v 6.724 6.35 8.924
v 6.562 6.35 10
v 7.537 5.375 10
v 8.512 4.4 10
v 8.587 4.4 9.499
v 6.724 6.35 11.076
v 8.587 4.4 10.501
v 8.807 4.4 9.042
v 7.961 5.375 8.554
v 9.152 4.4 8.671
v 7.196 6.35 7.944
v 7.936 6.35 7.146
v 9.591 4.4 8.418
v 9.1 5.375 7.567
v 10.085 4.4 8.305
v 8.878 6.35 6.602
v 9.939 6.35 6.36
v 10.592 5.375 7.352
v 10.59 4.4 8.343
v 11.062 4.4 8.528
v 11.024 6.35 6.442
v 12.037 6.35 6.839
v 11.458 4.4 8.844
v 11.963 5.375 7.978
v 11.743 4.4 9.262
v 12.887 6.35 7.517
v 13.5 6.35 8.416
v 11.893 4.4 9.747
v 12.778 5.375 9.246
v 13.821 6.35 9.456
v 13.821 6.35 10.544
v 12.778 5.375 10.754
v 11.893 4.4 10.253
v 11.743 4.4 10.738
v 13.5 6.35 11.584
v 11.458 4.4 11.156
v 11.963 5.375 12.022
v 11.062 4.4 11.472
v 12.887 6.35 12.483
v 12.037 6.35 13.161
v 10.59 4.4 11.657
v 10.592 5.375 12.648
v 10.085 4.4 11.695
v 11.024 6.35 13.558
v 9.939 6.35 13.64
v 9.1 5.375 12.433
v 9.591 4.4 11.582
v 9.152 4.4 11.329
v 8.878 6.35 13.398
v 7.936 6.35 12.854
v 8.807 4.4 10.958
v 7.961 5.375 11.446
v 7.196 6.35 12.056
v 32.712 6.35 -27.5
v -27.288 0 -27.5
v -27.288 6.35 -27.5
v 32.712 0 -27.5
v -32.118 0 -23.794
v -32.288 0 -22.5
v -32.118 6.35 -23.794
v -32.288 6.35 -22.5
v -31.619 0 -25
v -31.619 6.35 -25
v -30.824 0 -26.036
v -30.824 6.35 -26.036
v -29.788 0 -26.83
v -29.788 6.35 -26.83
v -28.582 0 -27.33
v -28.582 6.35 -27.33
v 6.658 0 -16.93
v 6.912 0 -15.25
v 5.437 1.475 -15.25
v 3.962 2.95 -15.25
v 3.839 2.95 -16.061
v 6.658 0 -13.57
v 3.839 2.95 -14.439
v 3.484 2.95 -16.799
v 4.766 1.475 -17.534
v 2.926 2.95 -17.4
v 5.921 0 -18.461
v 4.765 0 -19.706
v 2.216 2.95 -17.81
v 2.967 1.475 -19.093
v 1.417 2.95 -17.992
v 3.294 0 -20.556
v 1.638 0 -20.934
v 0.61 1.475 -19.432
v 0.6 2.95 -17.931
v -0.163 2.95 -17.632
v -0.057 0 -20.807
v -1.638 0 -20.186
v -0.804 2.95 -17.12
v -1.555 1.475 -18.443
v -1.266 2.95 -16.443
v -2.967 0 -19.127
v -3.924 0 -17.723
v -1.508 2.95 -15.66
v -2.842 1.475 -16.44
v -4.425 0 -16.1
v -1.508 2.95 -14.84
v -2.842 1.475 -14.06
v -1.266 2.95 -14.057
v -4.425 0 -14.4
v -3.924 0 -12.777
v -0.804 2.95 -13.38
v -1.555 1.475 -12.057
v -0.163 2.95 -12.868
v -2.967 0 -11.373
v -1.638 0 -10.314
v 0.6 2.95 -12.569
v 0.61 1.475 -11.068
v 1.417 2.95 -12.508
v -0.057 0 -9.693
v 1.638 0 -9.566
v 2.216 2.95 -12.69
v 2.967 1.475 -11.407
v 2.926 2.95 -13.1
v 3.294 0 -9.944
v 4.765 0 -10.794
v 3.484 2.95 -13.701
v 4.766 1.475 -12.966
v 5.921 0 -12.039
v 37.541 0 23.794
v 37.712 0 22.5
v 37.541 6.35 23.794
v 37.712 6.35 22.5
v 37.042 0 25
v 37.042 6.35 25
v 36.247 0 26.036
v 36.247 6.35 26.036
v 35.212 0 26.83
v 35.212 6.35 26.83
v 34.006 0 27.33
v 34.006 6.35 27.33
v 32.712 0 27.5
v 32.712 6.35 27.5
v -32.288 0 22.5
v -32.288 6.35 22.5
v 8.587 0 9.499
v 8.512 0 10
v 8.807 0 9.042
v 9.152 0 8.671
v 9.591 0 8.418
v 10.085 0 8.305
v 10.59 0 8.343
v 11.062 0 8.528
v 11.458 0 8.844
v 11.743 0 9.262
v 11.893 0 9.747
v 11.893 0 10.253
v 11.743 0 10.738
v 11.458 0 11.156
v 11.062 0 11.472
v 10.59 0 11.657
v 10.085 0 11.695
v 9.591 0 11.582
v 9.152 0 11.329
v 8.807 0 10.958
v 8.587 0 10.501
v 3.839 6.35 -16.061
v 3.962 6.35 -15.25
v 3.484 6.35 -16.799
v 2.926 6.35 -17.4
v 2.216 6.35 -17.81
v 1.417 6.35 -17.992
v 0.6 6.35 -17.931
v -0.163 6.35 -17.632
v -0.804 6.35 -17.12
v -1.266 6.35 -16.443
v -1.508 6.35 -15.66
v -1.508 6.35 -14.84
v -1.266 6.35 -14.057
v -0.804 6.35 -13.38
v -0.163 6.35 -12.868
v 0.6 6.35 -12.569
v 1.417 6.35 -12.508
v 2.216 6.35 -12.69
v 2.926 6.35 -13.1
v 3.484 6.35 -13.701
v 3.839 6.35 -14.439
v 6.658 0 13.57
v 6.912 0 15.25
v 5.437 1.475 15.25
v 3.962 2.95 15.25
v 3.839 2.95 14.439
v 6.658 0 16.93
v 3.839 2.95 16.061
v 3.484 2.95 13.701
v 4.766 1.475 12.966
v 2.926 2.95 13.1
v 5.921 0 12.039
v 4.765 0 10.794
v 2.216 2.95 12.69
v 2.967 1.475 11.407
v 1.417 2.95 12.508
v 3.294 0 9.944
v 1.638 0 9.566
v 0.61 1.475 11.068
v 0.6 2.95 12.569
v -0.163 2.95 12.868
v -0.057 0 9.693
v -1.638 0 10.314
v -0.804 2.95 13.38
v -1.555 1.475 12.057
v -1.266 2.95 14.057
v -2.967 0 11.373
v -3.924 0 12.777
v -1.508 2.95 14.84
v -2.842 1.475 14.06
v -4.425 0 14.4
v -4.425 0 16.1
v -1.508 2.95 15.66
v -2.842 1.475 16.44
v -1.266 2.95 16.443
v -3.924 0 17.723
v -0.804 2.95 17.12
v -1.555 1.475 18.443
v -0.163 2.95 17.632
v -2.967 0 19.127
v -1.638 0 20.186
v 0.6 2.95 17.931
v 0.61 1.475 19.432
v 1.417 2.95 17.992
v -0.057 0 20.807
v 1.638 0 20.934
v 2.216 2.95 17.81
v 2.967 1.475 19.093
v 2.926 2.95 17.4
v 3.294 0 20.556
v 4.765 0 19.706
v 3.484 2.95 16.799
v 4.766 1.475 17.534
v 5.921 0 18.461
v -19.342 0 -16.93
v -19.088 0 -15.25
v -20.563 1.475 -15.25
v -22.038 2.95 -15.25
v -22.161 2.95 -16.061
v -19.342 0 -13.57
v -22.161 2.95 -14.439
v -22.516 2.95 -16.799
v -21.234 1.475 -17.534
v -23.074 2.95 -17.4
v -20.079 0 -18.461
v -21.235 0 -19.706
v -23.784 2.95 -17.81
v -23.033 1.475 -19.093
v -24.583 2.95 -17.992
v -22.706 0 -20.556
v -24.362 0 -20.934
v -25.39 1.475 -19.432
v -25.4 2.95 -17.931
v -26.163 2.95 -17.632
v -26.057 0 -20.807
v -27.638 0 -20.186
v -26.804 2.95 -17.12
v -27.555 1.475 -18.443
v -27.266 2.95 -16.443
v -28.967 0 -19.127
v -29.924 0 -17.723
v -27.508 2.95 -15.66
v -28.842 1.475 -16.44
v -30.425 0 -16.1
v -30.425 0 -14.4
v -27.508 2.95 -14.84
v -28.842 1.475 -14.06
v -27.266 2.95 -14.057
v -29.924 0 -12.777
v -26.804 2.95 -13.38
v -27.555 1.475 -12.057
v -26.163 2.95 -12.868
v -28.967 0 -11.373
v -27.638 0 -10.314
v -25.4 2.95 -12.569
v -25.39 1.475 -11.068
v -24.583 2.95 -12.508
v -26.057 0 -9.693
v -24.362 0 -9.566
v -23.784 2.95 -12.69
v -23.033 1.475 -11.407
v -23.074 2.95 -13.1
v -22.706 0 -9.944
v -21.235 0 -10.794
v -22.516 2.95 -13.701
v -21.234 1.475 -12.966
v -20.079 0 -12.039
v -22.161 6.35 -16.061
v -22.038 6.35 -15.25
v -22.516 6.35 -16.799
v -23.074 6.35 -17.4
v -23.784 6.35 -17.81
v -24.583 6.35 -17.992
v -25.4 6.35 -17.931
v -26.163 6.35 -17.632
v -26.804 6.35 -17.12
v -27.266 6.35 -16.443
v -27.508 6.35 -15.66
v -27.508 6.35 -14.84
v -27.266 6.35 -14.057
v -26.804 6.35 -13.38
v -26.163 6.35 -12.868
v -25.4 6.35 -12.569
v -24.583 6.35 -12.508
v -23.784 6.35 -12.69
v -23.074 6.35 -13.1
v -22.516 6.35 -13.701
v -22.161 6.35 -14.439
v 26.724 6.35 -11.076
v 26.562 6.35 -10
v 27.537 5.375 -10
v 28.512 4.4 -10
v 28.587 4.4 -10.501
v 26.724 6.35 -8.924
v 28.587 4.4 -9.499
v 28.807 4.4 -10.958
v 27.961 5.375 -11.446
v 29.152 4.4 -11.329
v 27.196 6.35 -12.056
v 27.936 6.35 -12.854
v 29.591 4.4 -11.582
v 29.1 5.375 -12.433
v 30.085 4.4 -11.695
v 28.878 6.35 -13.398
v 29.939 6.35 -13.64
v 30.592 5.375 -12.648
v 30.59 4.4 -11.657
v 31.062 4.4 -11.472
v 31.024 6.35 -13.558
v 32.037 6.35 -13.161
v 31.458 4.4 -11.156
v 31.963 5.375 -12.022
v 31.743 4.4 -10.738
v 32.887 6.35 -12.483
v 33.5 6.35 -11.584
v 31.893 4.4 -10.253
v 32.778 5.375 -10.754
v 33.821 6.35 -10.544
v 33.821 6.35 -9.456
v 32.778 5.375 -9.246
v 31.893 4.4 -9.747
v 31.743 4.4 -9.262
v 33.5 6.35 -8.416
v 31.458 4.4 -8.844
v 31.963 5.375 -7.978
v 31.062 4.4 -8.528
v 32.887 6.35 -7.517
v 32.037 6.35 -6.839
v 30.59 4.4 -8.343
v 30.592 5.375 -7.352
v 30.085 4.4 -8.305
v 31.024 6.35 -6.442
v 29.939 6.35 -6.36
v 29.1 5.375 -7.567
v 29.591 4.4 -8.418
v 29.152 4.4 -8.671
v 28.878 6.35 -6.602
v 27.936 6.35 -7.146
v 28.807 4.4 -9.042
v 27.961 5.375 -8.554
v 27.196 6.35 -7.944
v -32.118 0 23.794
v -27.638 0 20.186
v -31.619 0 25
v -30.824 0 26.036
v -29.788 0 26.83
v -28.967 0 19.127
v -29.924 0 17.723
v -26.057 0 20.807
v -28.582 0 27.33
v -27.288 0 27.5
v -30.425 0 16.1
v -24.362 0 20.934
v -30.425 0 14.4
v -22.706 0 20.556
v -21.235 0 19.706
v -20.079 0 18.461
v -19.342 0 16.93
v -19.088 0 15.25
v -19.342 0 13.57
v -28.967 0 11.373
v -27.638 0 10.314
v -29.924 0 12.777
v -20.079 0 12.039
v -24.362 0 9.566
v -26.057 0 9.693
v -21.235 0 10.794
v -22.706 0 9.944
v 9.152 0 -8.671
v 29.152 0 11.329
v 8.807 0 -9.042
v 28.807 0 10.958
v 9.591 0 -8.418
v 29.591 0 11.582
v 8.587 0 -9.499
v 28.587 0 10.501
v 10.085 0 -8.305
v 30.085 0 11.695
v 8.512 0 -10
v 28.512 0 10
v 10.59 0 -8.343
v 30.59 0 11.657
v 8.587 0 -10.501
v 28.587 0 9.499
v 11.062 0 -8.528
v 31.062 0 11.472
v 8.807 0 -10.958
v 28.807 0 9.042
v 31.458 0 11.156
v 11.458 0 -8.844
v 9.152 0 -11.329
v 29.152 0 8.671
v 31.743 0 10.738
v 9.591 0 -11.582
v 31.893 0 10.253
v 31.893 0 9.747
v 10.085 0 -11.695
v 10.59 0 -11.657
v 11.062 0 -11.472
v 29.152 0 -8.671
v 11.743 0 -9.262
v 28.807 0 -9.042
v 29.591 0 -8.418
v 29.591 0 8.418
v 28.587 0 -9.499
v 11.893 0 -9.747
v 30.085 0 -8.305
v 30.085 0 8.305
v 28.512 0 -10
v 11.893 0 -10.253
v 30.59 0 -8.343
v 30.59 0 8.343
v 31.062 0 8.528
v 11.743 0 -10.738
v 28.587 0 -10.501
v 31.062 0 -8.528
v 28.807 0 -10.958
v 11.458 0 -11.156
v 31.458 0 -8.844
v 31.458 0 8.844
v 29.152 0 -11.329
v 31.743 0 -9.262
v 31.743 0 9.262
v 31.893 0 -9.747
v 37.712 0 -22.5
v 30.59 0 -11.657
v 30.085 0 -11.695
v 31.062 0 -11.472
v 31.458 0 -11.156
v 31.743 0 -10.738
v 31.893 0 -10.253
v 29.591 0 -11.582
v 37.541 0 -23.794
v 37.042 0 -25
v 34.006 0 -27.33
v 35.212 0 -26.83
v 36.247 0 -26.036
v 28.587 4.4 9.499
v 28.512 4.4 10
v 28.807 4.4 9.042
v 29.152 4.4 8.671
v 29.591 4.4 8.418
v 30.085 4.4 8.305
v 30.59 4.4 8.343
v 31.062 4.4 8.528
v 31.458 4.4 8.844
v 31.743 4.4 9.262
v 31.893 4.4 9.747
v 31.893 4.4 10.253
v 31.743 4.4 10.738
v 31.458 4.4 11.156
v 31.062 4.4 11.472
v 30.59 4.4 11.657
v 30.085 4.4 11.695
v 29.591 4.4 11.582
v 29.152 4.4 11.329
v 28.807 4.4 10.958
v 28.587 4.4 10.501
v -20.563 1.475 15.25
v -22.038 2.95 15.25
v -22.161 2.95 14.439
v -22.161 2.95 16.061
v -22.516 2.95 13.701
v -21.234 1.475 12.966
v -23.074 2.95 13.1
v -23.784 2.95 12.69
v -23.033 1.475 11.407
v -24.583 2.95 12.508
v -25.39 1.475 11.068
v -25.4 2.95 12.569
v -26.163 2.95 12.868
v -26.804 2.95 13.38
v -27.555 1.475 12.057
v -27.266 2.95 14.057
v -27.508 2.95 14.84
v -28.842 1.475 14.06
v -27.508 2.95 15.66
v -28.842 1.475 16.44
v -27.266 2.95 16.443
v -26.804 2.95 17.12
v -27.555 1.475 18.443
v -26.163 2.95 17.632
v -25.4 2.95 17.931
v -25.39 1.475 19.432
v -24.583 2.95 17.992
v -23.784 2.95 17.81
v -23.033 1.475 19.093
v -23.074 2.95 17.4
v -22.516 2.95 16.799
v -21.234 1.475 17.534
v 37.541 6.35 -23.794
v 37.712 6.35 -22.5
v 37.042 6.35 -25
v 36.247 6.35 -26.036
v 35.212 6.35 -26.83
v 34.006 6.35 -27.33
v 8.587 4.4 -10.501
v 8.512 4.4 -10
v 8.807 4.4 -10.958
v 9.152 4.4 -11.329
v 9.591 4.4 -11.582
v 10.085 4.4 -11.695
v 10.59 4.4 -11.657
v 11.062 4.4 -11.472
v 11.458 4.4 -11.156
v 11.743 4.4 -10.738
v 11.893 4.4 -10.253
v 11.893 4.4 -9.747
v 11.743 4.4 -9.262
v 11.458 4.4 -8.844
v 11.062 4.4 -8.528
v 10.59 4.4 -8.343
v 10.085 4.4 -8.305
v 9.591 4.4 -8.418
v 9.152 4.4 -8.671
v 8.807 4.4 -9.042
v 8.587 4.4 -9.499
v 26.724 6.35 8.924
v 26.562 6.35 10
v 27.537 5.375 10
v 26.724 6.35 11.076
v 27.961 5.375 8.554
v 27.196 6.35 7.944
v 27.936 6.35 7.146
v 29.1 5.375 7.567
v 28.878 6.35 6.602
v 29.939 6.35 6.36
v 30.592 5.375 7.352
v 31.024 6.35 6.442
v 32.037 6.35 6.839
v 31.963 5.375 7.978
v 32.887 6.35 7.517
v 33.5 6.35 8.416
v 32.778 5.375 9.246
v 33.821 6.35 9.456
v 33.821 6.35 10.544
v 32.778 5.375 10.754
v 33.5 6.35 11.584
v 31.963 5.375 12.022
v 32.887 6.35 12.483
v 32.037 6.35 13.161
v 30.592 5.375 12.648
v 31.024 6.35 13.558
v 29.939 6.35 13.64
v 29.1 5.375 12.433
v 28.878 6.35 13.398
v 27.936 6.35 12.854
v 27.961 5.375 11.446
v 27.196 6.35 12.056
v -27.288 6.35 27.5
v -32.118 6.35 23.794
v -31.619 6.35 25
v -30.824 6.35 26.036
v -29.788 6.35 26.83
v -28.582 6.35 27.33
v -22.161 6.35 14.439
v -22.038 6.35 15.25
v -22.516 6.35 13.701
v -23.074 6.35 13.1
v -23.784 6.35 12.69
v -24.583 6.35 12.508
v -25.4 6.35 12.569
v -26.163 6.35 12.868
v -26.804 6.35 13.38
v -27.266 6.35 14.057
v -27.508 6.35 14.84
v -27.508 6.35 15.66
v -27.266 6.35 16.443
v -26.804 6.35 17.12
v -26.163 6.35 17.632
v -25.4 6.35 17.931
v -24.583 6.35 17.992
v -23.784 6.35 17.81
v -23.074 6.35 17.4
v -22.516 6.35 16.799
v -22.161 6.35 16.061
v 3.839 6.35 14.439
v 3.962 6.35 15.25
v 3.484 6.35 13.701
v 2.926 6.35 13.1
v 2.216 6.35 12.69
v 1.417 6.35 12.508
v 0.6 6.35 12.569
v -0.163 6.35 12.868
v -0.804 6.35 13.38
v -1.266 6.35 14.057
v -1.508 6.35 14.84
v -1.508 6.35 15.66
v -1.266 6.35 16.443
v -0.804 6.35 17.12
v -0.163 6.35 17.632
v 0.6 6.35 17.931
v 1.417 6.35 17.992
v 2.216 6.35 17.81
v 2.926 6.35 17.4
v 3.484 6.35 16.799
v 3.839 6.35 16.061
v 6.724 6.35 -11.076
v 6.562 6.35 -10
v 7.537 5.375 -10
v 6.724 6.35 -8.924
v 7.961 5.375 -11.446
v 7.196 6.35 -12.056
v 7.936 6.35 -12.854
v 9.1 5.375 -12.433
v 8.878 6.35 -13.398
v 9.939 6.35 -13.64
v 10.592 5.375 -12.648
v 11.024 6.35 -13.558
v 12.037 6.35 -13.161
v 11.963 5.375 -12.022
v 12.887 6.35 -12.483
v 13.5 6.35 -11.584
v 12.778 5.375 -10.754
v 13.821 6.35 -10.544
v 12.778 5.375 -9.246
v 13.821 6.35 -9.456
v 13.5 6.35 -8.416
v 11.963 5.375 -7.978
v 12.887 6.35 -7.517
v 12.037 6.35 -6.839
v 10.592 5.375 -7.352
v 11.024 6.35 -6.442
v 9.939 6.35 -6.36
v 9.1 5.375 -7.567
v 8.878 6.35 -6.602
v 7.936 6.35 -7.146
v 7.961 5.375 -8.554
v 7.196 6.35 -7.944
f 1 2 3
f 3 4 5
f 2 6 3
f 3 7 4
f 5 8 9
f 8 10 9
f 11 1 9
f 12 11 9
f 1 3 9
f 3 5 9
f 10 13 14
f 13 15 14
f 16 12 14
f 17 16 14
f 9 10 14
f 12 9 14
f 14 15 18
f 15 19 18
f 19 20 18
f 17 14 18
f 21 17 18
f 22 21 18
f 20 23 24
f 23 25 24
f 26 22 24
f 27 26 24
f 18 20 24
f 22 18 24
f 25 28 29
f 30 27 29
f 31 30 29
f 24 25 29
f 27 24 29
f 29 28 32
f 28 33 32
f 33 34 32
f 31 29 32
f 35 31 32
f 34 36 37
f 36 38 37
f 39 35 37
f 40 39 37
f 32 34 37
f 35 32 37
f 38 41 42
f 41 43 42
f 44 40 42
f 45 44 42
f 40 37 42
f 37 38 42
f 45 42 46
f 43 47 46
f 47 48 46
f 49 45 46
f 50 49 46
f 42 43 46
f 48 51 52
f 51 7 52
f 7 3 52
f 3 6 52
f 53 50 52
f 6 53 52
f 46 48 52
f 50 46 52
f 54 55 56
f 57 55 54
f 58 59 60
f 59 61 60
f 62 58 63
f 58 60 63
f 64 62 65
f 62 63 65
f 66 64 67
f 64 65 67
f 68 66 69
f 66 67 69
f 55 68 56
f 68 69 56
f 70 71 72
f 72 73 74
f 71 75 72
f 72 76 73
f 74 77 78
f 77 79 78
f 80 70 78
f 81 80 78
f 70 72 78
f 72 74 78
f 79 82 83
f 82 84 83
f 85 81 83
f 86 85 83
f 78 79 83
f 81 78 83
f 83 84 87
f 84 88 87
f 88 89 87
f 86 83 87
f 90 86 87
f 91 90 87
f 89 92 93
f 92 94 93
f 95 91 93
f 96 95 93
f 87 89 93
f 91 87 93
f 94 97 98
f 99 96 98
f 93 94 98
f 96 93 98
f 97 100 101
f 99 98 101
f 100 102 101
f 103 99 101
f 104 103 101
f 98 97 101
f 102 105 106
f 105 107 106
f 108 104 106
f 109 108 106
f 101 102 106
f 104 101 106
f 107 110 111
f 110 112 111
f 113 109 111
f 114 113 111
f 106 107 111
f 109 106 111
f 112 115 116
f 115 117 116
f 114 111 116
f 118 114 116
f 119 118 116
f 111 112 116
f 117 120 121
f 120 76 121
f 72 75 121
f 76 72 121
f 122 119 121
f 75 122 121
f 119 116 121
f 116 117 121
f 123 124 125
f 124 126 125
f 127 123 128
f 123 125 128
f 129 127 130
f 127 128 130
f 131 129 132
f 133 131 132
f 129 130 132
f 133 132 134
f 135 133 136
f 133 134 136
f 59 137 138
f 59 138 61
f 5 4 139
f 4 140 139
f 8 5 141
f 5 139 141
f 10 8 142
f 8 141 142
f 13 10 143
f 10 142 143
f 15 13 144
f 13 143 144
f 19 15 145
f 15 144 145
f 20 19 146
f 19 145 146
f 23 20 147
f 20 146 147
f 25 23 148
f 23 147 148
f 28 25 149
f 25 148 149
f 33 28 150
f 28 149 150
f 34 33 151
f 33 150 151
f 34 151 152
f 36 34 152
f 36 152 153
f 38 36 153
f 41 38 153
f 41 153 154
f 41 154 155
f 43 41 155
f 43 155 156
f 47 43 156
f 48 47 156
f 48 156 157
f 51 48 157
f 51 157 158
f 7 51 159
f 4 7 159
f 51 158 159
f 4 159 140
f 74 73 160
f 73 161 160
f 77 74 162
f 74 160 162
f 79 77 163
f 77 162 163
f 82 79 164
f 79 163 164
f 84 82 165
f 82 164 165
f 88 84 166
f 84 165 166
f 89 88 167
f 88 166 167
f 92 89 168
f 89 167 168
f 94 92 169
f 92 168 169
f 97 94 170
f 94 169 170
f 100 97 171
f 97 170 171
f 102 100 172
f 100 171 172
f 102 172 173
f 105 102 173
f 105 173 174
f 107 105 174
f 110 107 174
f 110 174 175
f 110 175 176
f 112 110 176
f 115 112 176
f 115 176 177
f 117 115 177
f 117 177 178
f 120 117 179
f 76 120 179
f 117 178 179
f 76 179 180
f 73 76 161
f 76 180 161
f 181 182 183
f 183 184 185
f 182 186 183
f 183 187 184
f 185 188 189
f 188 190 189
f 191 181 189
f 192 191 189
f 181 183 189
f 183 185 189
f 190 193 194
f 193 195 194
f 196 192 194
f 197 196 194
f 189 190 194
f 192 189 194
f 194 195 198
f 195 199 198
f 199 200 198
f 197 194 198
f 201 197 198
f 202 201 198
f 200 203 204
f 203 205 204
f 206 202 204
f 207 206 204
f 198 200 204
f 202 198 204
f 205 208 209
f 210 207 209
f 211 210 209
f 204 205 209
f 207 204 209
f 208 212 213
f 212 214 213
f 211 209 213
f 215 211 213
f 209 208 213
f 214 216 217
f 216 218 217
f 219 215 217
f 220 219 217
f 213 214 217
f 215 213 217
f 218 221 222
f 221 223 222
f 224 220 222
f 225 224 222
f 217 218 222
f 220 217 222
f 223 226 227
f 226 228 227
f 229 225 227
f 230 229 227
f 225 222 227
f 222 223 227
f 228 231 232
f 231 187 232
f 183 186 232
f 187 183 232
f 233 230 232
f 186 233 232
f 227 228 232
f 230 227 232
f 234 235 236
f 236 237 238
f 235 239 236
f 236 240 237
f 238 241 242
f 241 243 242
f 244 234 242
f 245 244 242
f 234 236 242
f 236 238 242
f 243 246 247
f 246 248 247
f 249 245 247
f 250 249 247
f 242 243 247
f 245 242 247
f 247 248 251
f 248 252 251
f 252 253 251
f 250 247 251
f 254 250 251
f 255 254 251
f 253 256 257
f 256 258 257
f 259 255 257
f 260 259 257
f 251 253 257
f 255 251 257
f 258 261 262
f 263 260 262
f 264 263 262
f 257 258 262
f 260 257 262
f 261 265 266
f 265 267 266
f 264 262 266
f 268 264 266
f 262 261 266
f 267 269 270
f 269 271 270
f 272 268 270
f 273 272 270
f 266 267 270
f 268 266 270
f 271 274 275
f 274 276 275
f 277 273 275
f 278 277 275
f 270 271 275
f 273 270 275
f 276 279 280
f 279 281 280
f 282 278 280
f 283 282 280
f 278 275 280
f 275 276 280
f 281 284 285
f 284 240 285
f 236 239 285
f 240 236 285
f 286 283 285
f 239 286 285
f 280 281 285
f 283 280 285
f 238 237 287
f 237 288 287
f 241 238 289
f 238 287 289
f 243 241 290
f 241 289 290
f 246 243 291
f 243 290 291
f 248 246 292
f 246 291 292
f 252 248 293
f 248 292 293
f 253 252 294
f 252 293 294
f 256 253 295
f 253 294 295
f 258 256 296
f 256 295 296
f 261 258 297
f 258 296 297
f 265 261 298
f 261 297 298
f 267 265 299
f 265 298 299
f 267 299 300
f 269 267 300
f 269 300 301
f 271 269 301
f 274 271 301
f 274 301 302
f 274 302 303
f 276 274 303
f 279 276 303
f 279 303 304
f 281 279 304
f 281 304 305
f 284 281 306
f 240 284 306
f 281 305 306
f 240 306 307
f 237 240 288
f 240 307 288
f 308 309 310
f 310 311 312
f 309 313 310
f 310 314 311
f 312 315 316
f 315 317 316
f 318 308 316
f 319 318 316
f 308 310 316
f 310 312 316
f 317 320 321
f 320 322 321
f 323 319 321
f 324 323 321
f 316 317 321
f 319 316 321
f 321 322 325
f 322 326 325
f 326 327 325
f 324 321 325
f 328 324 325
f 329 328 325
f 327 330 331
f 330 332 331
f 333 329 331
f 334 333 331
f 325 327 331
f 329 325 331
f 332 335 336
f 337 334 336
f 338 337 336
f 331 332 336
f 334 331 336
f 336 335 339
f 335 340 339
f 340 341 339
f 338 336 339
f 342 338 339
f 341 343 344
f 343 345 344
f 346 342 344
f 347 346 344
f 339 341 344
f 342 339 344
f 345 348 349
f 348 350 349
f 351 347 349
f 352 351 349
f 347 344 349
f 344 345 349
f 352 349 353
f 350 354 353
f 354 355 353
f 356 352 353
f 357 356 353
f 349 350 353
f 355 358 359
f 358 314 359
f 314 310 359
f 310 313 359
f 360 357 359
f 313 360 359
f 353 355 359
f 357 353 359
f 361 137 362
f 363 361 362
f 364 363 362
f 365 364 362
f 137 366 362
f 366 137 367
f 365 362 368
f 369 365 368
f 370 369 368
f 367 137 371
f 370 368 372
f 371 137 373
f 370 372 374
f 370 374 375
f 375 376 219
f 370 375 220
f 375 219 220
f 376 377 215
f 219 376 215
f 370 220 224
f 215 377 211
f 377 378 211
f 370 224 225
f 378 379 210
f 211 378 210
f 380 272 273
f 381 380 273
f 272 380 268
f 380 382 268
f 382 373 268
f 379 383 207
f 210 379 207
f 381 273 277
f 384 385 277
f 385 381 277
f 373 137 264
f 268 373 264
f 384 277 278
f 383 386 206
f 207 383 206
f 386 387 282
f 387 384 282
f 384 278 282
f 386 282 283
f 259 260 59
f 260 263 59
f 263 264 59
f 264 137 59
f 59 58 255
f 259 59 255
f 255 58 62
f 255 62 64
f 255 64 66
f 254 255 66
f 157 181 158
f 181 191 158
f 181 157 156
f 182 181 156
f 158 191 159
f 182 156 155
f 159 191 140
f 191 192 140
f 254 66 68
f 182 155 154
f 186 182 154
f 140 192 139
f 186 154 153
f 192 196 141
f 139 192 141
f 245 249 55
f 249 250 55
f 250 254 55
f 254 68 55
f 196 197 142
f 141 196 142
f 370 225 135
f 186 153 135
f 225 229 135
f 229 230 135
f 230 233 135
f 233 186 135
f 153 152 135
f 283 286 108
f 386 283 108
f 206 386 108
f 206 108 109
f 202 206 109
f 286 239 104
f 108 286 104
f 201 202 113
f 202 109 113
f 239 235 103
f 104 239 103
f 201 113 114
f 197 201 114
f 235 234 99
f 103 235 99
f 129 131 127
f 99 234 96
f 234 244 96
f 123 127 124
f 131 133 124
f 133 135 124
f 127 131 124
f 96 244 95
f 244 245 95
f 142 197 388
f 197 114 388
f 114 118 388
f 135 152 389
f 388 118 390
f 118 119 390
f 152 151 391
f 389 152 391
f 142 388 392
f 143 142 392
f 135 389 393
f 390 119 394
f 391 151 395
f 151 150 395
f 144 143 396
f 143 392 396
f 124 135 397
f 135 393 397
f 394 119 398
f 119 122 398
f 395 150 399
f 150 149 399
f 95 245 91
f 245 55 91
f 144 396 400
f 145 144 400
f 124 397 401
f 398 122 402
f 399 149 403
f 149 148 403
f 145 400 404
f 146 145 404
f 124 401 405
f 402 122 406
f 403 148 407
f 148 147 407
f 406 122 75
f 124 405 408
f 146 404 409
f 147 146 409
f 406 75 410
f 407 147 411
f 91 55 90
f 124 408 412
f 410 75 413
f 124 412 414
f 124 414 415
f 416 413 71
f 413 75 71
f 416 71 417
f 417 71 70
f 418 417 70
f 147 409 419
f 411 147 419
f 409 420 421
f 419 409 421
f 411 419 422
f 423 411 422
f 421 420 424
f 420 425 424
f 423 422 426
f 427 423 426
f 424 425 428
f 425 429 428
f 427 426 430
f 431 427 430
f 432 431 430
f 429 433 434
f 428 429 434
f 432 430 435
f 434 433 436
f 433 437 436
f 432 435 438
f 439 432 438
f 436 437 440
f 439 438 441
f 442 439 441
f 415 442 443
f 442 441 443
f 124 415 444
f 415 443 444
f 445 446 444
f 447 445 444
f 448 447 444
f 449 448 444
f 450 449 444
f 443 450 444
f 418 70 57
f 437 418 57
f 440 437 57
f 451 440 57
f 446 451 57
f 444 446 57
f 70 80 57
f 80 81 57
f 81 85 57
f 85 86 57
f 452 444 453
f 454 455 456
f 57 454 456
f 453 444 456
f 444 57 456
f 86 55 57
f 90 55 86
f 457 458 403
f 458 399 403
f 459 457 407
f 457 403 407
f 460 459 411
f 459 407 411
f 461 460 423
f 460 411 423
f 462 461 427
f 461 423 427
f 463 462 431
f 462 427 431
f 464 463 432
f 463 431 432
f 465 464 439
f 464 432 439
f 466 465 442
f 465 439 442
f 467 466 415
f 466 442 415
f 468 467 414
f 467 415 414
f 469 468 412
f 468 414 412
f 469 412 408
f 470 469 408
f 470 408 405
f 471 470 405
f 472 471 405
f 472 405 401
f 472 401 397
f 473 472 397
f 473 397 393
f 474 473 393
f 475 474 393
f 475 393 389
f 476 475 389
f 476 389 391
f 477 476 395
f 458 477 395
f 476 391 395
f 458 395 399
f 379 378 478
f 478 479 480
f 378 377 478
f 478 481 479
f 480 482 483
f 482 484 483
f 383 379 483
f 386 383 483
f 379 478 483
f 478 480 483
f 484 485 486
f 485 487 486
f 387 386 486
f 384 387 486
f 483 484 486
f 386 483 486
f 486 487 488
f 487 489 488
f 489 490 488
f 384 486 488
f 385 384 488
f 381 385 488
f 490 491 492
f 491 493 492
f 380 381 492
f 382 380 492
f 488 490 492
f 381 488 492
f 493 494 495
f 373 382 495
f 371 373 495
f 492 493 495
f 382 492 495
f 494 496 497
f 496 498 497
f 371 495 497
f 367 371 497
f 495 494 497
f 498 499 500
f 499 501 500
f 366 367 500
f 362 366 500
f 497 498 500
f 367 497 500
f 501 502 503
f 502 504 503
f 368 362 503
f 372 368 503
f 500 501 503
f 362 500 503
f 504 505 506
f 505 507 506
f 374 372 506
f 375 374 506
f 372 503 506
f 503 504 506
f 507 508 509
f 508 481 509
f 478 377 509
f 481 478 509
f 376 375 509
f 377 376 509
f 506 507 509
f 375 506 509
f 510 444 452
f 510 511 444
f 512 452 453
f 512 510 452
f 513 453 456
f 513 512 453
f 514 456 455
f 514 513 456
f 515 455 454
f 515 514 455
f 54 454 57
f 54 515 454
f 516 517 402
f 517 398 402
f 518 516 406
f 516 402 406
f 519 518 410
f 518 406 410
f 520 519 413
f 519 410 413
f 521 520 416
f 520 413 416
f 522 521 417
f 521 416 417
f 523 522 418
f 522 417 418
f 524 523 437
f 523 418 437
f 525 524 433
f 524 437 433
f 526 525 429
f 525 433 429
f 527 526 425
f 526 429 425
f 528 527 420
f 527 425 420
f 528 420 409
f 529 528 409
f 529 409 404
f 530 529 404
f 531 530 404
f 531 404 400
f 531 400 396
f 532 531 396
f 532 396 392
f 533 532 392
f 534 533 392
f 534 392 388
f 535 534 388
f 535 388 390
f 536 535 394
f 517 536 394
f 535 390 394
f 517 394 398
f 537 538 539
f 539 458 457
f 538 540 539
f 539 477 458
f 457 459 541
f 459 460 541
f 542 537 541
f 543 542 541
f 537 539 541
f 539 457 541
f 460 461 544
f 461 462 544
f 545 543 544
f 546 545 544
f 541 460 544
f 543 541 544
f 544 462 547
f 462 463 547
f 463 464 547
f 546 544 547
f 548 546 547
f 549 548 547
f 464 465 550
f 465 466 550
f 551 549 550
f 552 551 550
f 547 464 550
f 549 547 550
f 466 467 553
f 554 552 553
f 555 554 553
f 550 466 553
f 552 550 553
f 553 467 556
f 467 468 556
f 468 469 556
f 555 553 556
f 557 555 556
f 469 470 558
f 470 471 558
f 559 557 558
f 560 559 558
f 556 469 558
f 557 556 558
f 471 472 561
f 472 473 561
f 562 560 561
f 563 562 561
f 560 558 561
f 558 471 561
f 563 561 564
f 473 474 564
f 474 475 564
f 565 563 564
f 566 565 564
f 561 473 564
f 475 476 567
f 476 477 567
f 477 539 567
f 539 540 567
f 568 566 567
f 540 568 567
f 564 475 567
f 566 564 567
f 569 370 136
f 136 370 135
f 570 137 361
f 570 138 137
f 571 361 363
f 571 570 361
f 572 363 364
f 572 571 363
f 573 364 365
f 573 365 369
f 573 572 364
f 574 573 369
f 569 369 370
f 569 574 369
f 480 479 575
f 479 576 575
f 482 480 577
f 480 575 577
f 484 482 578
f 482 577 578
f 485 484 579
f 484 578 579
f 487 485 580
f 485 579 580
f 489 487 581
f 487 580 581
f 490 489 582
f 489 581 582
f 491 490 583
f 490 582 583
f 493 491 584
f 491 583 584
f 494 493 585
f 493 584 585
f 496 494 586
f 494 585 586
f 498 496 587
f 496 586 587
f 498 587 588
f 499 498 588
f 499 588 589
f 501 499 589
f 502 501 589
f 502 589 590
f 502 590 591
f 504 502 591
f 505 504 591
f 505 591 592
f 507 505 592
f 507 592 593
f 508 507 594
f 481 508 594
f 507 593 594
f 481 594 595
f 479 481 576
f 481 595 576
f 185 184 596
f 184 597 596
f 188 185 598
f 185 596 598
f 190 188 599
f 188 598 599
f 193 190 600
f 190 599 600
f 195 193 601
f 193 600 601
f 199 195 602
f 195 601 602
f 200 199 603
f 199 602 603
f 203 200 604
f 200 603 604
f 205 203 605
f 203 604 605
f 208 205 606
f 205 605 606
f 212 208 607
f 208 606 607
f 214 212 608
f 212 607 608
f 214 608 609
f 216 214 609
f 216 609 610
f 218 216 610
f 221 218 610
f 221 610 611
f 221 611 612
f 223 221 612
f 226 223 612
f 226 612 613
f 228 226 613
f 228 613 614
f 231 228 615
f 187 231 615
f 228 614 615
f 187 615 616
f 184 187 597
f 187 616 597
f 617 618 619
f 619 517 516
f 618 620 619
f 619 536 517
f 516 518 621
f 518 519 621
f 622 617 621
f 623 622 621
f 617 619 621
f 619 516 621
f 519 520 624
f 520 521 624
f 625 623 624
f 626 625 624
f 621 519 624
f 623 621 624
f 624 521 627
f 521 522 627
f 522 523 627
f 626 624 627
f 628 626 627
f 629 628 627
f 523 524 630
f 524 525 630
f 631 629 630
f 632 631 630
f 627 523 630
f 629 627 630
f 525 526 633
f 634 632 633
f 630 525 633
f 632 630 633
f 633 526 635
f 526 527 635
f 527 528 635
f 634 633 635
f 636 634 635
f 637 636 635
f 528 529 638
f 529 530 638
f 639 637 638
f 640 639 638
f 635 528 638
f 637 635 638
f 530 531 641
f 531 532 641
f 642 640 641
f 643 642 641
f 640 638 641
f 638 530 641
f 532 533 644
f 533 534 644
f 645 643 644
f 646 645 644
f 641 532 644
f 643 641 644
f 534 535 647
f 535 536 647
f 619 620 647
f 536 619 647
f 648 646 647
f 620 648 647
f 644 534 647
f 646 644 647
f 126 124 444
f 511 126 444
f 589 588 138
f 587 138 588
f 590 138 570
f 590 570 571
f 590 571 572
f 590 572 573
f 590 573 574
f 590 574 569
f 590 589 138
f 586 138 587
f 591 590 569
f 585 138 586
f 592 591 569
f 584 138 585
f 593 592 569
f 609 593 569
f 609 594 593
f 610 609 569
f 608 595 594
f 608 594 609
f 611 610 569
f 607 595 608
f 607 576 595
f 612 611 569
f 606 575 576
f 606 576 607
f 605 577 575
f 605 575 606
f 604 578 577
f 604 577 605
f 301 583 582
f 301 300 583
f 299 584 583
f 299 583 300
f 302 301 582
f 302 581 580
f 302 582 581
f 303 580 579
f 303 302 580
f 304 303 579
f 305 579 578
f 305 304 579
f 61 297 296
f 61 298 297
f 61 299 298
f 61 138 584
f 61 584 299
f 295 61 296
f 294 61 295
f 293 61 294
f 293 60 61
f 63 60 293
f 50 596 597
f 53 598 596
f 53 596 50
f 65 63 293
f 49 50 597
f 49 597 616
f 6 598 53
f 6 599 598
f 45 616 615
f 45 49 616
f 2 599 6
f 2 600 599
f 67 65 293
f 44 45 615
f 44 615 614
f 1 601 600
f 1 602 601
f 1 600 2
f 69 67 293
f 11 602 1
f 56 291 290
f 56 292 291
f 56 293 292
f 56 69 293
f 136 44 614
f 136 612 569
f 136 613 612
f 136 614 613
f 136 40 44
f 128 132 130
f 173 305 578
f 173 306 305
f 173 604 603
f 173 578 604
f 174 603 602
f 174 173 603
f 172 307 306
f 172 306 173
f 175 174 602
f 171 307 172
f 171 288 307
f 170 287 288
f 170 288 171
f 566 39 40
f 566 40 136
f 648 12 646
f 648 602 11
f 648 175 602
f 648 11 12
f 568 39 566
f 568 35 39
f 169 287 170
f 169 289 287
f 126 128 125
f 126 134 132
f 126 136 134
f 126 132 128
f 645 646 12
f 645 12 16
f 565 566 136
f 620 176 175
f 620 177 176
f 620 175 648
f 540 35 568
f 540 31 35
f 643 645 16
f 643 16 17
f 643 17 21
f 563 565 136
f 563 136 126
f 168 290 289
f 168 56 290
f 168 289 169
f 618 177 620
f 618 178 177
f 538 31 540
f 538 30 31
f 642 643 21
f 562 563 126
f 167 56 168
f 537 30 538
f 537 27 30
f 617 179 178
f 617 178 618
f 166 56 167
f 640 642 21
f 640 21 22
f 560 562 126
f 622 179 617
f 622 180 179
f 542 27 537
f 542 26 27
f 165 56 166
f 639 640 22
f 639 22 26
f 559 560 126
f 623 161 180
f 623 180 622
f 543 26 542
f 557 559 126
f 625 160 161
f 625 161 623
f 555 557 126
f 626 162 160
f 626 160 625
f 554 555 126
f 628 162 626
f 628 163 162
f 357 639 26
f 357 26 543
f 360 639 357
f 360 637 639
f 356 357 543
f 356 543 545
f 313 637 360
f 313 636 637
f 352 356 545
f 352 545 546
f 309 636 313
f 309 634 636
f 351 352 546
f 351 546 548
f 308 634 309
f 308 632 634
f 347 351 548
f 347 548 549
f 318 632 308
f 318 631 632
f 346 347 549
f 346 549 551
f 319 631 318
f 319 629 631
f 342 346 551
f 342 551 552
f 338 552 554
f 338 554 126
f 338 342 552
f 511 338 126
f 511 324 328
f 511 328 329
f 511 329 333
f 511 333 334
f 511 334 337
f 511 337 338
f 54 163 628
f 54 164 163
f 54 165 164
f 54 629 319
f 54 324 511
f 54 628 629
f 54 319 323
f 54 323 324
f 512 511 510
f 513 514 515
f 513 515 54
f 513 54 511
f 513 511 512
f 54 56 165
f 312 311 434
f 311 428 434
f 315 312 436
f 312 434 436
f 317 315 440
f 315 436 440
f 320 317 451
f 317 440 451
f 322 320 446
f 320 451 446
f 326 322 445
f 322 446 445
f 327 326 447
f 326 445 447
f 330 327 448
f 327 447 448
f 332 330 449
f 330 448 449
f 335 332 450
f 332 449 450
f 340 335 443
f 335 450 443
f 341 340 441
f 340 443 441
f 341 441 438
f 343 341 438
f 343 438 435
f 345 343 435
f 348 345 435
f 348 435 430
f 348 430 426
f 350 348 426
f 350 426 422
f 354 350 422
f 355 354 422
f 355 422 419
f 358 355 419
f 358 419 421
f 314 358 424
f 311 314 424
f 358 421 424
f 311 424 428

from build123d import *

# Parameters (mm, degrees)
SKETCH1_W                                       = 70
SKETCH1_H                                       = 55
BOSS_EXTRUDE1_DEPTH                             = 6.35
CUT_EXTRUDE1_START                              = 6.35
SKETCH1_3_R                                     = 1
CUT_EXTRUDE1_DEPTH                              = 6.35
CSK_FOR_M3_FLAT_HEAD_MACHINE_SCREW1_D           = 3.4
CSK_FOR_M3_FLAT_HEAD_MACHINE_SCREW1_CSINK_D     = 7.3
CSK_FOR_M3_FLAT_HEAD_MACHINE_SCREW1_CSINK_ANGLE = 90
FILLET1_R                                       = 5
CSK_FOR_M5_FLAT_HEAD_MACHINE_SCREW2_D           = 5.5
CSK_FOR_M5_FLAT_HEAD_MACHINE_SCREW2_CSINK_D     = 11.4
CSK_FOR_M5_FLAT_HEAD_MACHINE_SCREW2_CSINK_ANGLE = 90


with BuildPart() as part:
    # Sketch1 → Boss-Extrude1 (new body)
    with BuildSketch(Plane(origin=(0, 0, 0), x_dir=(1, 0, 0), z_dir=(0, 1, 0))):
        with Locations((2.711596357, 0)):
            Rectangle(SKETCH1_W, SKETCH1_H)
    extrude(amount=BOSS_EXTRUDE1_DEPTH)

    # Sketch1<3> → Cut-Extrude1 (cut)
    with BuildSketch(Plane(origin=(0, 0, 0), x_dir=(1, 0, 0), z_dir=(0, 1, 0)).offset(CUT_EXTRUDE1_START)):
        with Locations(Location((30.211596357, -10, 0), (0, 0, 90))):
            Circle(SKETCH1_3_R)
        with Locations(Location((10.211596357, -10, 0), (0, 0, 90))):
            Circle(SKETCH1_3_R)
        with Locations(Location((30.211596357, 10, 0), (0, 0, 90))):
            Circle(SKETCH1_3_R)
        with Locations(Location((10.211596357, 10, 0), (0, 0, 90))):
            Circle(SKETCH1_3_R)
        with Locations(Location((1.211596357, -15.25, 0), (0, 0, 90))):
            Circle(SKETCH1_3_R)
        with Locations(Location((-24.788403643, -15.25, 0), (0, 0, 90))):
            Circle(SKETCH1_3_R)
        with Locations(Location((1.211596357, 15.25, 0), (0, 0, 90))):
            Circle(SKETCH1_3_R)
        with Locations(Location((-24.788403643, 15.25, 0), (0, 0, 90))):
            Circle(SKETCH1_3_R)
    extrude(amount=-CUT_EXTRUDE1_DEPTH, mode=Mode.SUBTRACT)

    # CSK for M3 Flat Head Machine Screw1 (through all)
    with Locations(Plane(origin=(0, 6.35, 0), x_dir=(1, 0, 0), z_dir=(0, 1, 0))):
        with Locations((30.211596357, -10), (10.211596357, -10), (10.211596357, 10), (30.211596357, 10)):
            CounterSinkHole(CSK_FOR_M3_FLAT_HEAD_MACHINE_SCREW1_D / 2, CSK_FOR_M3_FLAT_HEAD_MACHINE_SCREW1_CSINK_D / 2, counter_sink_angle=CSK_FOR_M3_FLAT_HEAD_MACHINE_SCREW1_CSINK_ANGLE)

    # Fillet1
    fillet1_edges = [part.edges().sort_by_distance(p)[0] for p in [
        (37.711596357, 3.175, 27.5),
        (37.711596357, 3.175, -27.5),
        (-32.288403643, 3.175, -27.5),
        (-32.288403643, 3.175, 27.5),
    ]]
    fillet(fillet1_edges, radius=FILLET1_R)

    # CSK for M5 Flat Head Machine Screw2 (through all)
    with Locations(Plane(origin=(0, 0, 0), x_dir=(-1, 0, 0), z_dir=(0, -1, 0))):
        with Locations((24.788403643, -15.25), (24.788403643, 15.25), (-1.211596357, 15.25), (-1.211596357, -15.25)):
            CounterSinkHole(CSK_FOR_M5_FLAT_HEAD_MACHINE_SCREW2_D / 2, CSK_FOR_M5_FLAT_HEAD_MACHINE_SCREW2_CSINK_D / 2, counter_sink_angle=CSK_FOR_M5_FLAT_HEAD_MACHINE_SCREW2_CSINK_ANGLE)


solid = part.part
